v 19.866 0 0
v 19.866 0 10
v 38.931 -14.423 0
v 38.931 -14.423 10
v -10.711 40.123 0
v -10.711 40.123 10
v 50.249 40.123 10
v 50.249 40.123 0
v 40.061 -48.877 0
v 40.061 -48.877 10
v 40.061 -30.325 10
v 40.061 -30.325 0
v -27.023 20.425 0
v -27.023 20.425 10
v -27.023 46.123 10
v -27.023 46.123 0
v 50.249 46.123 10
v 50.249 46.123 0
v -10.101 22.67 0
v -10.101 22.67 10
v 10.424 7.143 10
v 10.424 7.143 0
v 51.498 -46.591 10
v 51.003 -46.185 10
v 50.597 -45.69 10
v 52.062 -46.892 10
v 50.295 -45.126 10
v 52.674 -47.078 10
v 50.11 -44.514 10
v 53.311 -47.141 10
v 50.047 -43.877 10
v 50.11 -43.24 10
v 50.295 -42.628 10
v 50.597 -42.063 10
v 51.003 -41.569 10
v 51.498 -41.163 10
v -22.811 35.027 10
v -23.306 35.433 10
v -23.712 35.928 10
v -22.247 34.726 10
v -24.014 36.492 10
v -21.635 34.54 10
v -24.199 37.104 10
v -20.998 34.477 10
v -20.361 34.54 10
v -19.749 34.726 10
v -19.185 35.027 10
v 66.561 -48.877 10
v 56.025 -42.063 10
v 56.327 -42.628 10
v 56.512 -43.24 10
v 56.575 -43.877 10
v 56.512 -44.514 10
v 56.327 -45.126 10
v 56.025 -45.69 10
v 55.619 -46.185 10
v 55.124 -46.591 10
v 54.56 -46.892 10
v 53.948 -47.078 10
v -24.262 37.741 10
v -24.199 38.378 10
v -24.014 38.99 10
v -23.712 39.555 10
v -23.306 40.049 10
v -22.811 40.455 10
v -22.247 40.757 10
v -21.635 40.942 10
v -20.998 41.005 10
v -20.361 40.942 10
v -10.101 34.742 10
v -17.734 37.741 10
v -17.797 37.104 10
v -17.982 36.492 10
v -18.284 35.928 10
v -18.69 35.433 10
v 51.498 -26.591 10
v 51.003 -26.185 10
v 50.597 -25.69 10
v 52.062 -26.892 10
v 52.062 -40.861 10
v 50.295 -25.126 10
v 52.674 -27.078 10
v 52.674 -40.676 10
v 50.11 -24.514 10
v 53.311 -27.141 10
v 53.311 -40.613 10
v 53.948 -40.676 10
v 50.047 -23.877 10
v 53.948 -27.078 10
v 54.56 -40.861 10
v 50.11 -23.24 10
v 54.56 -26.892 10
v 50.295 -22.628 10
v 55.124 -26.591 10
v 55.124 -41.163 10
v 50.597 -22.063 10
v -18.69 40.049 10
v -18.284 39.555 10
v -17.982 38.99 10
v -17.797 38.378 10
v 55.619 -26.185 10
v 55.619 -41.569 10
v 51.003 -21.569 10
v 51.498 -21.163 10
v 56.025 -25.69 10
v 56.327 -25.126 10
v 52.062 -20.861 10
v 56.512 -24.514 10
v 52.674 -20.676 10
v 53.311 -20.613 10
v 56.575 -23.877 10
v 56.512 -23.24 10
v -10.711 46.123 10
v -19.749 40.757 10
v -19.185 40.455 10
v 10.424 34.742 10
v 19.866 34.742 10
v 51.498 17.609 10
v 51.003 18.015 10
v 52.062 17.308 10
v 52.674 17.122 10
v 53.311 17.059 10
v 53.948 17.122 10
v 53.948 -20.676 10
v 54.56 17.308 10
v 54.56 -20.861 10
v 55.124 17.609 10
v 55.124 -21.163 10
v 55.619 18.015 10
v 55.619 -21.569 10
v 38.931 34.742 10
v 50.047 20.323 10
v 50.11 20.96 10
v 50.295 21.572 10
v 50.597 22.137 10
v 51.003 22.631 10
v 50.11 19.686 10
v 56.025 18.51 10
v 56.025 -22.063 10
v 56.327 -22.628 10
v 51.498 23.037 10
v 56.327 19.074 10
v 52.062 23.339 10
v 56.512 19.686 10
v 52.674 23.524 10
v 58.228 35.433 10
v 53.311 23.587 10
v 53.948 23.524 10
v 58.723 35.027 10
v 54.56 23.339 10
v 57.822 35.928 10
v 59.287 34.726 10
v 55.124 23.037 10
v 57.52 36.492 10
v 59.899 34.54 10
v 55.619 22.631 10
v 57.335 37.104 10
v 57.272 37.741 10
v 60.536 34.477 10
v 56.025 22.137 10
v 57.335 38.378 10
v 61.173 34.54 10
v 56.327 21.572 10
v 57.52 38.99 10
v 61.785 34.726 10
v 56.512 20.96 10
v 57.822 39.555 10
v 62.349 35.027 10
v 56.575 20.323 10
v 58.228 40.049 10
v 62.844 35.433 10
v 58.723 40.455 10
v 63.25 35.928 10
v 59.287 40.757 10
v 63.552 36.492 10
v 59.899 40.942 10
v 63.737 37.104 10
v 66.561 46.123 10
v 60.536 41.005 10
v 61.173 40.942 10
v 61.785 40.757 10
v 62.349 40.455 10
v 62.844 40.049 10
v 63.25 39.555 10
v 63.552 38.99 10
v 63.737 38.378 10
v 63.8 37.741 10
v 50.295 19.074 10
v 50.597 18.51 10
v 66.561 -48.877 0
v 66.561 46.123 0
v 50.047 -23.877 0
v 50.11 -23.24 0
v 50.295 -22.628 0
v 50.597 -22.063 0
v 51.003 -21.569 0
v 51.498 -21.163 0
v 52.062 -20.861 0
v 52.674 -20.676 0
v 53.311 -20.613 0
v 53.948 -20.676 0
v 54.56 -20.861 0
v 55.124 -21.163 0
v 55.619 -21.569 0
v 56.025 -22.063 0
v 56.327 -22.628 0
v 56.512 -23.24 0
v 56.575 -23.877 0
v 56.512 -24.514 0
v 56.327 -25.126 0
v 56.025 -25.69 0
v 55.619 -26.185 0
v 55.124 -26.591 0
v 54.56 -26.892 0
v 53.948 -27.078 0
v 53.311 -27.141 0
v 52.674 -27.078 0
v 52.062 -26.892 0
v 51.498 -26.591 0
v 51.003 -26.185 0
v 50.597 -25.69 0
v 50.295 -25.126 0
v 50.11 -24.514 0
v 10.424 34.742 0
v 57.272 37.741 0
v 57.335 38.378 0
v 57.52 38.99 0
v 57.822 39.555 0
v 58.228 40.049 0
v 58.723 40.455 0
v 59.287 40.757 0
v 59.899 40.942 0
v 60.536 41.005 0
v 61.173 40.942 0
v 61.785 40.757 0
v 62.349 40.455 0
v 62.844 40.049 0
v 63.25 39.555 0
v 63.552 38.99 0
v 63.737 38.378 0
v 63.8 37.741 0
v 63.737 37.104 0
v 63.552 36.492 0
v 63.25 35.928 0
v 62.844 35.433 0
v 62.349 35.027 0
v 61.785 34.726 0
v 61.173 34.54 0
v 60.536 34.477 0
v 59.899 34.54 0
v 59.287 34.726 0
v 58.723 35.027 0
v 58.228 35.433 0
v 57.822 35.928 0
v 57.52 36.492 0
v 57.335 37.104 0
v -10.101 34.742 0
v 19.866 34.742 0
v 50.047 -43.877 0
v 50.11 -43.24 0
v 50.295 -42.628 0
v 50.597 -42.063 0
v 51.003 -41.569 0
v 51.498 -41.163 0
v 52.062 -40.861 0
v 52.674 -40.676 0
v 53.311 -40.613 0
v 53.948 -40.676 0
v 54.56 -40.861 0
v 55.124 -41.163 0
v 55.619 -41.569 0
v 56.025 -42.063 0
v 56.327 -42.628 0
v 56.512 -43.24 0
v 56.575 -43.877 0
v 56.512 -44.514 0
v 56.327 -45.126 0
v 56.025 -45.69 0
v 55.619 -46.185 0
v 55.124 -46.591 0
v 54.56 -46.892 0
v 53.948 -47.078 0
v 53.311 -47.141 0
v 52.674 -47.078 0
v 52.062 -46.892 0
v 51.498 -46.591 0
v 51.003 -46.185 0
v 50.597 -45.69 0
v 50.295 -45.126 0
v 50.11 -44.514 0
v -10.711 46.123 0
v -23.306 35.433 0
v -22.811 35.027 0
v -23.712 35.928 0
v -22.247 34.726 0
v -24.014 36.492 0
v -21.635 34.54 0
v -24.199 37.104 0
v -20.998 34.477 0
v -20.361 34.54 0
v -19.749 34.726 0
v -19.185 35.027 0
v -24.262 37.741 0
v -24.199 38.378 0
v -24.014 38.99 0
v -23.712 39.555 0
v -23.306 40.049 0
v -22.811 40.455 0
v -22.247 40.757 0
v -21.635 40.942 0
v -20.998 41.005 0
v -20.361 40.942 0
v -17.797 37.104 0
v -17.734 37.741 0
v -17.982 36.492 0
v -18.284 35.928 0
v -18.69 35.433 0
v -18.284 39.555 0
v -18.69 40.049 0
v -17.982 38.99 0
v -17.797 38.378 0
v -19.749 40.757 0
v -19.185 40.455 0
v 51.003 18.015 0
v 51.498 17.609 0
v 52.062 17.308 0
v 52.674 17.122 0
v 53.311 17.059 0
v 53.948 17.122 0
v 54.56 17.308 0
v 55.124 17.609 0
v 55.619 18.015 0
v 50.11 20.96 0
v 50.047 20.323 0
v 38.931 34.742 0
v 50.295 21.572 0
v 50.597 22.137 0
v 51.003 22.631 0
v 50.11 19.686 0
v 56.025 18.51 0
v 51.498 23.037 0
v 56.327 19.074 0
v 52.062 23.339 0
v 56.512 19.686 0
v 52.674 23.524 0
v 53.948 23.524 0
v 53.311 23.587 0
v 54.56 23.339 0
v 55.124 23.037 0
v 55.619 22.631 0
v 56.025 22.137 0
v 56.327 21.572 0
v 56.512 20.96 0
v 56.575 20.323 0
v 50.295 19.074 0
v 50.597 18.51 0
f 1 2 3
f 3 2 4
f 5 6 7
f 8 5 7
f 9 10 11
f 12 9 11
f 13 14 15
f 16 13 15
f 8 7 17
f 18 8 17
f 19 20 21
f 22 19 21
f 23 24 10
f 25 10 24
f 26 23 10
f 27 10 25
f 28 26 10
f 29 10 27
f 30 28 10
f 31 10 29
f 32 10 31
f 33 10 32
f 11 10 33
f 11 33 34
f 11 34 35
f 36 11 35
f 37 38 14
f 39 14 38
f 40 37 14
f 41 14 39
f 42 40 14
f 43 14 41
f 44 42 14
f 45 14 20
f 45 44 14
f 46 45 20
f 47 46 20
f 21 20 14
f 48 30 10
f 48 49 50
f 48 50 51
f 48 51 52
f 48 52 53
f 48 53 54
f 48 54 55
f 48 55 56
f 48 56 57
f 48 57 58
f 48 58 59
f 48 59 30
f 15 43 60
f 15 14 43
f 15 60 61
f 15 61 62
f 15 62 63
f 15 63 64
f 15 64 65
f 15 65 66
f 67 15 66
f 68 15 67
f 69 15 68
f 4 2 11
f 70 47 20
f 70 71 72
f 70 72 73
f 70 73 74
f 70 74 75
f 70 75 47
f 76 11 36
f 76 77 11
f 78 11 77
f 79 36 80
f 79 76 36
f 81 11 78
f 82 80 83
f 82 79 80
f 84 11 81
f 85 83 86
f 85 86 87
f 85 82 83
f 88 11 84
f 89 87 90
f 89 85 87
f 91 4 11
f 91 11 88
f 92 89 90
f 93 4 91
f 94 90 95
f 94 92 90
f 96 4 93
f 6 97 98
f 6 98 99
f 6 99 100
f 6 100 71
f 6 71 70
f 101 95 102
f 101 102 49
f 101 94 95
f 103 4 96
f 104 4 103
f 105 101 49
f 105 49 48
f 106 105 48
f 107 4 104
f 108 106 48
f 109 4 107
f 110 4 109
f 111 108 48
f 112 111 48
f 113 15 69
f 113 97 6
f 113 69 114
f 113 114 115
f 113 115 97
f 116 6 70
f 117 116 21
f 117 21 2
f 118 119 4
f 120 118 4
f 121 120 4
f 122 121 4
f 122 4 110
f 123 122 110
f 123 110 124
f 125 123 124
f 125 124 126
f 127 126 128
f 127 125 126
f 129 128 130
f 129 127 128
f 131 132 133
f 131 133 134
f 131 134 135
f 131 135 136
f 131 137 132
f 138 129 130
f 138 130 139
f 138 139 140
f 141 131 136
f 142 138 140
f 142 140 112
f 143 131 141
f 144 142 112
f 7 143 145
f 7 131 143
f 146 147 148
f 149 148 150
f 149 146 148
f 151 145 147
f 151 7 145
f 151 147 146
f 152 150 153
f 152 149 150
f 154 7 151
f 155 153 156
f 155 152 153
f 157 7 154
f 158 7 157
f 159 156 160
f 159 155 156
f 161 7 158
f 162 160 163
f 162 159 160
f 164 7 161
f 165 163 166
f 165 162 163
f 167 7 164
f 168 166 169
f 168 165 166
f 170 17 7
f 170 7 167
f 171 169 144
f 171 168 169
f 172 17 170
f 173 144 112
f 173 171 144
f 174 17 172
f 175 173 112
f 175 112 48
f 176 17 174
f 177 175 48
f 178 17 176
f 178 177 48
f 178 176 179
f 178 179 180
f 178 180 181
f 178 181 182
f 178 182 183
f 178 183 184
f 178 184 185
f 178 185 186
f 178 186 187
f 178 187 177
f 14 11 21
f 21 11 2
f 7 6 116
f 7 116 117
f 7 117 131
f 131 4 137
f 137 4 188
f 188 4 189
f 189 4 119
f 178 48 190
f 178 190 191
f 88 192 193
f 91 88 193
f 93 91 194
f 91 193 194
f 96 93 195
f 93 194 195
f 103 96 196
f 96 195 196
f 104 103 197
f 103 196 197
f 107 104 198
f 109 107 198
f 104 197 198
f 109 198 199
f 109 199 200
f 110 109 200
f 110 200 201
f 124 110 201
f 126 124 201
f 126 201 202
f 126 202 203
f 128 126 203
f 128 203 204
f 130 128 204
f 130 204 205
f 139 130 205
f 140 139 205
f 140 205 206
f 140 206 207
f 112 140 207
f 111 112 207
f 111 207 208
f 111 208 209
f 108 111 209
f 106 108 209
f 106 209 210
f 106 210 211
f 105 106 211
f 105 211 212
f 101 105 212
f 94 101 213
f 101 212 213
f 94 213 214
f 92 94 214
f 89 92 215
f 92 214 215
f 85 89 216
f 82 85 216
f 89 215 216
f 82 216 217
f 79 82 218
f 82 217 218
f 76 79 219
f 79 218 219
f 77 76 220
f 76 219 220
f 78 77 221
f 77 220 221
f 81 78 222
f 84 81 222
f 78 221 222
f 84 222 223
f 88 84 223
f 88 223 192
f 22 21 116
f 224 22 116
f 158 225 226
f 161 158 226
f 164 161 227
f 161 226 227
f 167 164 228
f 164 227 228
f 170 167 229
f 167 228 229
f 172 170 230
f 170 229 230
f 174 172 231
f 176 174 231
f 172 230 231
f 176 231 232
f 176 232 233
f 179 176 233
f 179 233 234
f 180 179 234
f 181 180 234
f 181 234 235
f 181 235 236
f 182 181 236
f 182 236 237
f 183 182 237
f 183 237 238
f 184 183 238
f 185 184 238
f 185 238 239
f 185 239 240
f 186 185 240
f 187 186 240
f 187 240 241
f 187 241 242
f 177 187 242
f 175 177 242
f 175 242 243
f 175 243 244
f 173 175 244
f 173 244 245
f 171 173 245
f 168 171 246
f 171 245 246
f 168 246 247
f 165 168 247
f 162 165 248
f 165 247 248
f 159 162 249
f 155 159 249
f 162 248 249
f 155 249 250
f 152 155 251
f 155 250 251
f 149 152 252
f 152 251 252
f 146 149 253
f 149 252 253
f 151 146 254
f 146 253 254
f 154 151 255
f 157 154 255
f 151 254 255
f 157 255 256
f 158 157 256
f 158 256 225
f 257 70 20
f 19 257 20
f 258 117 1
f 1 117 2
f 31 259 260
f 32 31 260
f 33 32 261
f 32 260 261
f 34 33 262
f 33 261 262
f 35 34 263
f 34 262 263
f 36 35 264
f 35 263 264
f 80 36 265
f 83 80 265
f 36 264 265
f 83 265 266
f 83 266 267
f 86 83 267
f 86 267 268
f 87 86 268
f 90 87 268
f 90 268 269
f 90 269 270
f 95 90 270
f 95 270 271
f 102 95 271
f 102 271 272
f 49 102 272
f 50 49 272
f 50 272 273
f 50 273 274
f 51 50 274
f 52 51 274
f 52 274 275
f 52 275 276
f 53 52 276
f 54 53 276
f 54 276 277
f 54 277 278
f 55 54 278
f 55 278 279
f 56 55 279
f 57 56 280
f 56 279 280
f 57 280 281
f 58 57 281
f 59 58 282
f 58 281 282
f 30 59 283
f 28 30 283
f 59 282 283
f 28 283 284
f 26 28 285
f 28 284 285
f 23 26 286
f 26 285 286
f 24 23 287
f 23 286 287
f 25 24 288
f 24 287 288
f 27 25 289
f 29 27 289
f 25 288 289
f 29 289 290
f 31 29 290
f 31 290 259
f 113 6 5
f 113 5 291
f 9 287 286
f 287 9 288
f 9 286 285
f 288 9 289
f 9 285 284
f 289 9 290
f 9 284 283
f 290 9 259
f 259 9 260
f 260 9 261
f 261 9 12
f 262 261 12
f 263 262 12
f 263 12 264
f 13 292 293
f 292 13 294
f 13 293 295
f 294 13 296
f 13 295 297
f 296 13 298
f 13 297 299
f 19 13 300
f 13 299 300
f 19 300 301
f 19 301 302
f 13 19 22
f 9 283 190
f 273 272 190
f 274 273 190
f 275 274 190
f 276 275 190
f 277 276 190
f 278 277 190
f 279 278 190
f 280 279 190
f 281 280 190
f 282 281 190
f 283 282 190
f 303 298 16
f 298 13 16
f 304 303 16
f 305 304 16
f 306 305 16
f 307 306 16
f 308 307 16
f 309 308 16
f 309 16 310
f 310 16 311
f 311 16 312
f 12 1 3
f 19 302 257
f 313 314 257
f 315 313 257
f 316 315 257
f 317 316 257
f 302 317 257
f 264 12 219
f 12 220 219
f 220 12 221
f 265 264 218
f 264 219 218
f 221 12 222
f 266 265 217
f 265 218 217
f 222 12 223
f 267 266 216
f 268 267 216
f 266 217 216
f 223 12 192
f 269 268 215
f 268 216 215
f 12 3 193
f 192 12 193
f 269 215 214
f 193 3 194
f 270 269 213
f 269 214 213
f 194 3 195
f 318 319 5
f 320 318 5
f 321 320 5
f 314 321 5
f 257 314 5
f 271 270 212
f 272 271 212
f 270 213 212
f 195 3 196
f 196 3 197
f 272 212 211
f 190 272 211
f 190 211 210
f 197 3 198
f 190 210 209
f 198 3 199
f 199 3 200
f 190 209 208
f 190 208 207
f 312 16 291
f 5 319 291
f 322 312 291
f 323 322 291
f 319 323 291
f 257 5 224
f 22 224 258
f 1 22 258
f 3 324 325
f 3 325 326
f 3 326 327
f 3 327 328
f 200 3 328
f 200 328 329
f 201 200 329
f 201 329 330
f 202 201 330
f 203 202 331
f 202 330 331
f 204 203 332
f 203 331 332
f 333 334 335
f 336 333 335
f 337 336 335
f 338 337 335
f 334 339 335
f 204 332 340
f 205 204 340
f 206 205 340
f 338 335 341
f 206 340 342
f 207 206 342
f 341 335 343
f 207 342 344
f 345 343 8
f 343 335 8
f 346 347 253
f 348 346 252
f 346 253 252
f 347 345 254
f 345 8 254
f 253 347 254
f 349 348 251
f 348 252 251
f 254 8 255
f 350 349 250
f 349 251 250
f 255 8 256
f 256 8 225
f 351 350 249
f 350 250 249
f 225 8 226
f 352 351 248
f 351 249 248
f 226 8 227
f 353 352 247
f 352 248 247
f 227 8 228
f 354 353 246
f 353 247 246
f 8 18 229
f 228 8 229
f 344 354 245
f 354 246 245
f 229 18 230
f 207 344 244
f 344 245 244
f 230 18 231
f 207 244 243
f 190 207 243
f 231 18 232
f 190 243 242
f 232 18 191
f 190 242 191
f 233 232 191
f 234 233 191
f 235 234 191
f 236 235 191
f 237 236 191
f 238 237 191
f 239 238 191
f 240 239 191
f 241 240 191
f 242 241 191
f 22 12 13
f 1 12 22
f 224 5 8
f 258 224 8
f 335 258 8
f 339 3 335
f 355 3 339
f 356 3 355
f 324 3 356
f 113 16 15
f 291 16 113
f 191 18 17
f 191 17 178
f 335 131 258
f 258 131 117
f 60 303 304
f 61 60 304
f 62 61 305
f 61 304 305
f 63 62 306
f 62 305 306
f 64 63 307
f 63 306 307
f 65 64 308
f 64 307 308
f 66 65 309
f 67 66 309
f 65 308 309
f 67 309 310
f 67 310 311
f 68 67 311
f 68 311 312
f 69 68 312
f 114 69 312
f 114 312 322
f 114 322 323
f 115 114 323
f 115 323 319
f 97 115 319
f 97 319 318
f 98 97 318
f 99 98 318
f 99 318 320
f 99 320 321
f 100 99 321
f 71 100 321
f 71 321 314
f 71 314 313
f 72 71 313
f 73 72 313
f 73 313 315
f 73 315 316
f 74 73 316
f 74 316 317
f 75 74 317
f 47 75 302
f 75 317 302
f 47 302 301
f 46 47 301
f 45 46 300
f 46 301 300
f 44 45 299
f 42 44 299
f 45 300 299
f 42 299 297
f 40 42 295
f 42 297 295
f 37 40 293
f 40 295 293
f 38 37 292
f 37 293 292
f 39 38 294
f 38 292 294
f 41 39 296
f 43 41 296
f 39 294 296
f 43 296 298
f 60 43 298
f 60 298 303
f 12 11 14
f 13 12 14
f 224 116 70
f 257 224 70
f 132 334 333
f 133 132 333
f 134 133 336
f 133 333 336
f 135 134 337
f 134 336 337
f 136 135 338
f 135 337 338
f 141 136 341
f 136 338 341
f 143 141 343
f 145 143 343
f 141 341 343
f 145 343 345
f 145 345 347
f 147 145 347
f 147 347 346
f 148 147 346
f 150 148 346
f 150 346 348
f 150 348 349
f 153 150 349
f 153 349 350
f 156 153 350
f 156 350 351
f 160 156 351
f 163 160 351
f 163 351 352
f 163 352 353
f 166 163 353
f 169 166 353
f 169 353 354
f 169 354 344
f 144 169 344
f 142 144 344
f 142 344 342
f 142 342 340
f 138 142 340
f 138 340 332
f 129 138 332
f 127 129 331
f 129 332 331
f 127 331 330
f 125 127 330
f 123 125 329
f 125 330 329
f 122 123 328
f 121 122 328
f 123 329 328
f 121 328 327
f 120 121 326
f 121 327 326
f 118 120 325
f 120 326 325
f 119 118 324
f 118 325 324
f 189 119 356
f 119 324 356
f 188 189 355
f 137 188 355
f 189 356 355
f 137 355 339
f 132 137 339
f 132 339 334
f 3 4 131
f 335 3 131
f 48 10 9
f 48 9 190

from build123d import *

# Parameters (mm, degrees)
F0_W      = 100.584
F0_H      = 98
F1_DEPTH  = 10
F3_D      = 6.528
F4_W      = 60.96
F4_H      = 6
F5_DEPTH  = 10
F7_DEPTH  = 10
F10_DEPTH = 10
F9_W      = 3.5
F9_H      = 98
F11_DEPTH = 10
F12_D     = 6.528
F13_W     = 26.5
F13_H     = 3
F14_DEPTH = 10
F16_DEPTH = 10


with BuildPart() as f1:
    # F0 (on Top) → F1 (new body)
    with BuildSketch(Plane.XY):
        with Locations((19.76898, -2.876867)):
            Rectangle(F0_W, F0_H)
    extrude(amount=F1_DEPTH)

    # F3 (through all)
    with Locations(Plane.XY.offset(10)):
        with Locations((-20.99802, 37.741133), (60.53598, 37.741133)):
            Hole(F3_D / 2)

    # F4 (on face) → F5 (cut, through all)
    with BuildSketch(Plane.XY.offset(10)):
        with Locations((19.76898, 43.123133)):
            Rectangle(F4_W, F4_H)
    extrude(amount=-F5_DEPTH, mode=Mode.SUBTRACT)

    # F6 (on face) → F7 (cut, through all)
    with BuildSketch(Plane.XY.offset(10)):
        Polygon((-30.52302, -51.876867), (40.06098, -51.876867), (40.06098, -30.325267), (-30.52302, 23.072742), align=None)
    extrude(amount=-F7_DEPTH, mode=Mode.SUBTRACT)

    # F9 (on face) → F10 (cut, through all)
    with BuildSketch(Plane.XY.offset(10)):
        Polygon((-30.52302, 23.072742), (-27.02302, 20.424932), (-27.02302, 46.123133), (-30.52302, 46.123133), align=None)
    extrude(amount=-F10_DEPTH, mode=Mode.SUBTRACT)

    # F9 (on face) → F11 (cut, through all)
    with BuildSketch(Plane.XY.offset(10)):
        with Locations((68.31098, -2.876867)):
            Rectangle(F9_W, F9_H)
    extrude(amount=-F11_DEPTH, mode=Mode.SUBTRACT)

    # F12 (through all)
    with Locations(Plane.XY.offset(10)):
        with Locations((53.31098, 20.323133), (53.31098, -43.876867), (53.31098, -23.876867)):
            Hole(F12_D / 2)

    # F13 (on face) → F14 (cut, through all)
    with BuildSketch(Plane.XY.offset(10)):
        with Locations((53.31098, -50.376867)):
            Rectangle(F13_W, F13_H)
    extrude(amount=-F14_DEPTH, mode=Mode.SUBTRACT)

    # F15 (on face) → F16 (cut, through all)
    with BuildSketch(Plane.XY.offset(10)):
        Polygon((10.423962, 34.742446), (-10.100968, 34.742446), (-10.100968, 22.670163), (10.423962, 7.1427), align=None)
        Polygon((38.931154, 34.742446), (19.865519, 34.742446), (19.865519, 0), (38.931154, -14.423481), align=None)
    extrude(amount=-F16_DEPTH, mode=Mode.SUBTRACT)


solid = f1.part
